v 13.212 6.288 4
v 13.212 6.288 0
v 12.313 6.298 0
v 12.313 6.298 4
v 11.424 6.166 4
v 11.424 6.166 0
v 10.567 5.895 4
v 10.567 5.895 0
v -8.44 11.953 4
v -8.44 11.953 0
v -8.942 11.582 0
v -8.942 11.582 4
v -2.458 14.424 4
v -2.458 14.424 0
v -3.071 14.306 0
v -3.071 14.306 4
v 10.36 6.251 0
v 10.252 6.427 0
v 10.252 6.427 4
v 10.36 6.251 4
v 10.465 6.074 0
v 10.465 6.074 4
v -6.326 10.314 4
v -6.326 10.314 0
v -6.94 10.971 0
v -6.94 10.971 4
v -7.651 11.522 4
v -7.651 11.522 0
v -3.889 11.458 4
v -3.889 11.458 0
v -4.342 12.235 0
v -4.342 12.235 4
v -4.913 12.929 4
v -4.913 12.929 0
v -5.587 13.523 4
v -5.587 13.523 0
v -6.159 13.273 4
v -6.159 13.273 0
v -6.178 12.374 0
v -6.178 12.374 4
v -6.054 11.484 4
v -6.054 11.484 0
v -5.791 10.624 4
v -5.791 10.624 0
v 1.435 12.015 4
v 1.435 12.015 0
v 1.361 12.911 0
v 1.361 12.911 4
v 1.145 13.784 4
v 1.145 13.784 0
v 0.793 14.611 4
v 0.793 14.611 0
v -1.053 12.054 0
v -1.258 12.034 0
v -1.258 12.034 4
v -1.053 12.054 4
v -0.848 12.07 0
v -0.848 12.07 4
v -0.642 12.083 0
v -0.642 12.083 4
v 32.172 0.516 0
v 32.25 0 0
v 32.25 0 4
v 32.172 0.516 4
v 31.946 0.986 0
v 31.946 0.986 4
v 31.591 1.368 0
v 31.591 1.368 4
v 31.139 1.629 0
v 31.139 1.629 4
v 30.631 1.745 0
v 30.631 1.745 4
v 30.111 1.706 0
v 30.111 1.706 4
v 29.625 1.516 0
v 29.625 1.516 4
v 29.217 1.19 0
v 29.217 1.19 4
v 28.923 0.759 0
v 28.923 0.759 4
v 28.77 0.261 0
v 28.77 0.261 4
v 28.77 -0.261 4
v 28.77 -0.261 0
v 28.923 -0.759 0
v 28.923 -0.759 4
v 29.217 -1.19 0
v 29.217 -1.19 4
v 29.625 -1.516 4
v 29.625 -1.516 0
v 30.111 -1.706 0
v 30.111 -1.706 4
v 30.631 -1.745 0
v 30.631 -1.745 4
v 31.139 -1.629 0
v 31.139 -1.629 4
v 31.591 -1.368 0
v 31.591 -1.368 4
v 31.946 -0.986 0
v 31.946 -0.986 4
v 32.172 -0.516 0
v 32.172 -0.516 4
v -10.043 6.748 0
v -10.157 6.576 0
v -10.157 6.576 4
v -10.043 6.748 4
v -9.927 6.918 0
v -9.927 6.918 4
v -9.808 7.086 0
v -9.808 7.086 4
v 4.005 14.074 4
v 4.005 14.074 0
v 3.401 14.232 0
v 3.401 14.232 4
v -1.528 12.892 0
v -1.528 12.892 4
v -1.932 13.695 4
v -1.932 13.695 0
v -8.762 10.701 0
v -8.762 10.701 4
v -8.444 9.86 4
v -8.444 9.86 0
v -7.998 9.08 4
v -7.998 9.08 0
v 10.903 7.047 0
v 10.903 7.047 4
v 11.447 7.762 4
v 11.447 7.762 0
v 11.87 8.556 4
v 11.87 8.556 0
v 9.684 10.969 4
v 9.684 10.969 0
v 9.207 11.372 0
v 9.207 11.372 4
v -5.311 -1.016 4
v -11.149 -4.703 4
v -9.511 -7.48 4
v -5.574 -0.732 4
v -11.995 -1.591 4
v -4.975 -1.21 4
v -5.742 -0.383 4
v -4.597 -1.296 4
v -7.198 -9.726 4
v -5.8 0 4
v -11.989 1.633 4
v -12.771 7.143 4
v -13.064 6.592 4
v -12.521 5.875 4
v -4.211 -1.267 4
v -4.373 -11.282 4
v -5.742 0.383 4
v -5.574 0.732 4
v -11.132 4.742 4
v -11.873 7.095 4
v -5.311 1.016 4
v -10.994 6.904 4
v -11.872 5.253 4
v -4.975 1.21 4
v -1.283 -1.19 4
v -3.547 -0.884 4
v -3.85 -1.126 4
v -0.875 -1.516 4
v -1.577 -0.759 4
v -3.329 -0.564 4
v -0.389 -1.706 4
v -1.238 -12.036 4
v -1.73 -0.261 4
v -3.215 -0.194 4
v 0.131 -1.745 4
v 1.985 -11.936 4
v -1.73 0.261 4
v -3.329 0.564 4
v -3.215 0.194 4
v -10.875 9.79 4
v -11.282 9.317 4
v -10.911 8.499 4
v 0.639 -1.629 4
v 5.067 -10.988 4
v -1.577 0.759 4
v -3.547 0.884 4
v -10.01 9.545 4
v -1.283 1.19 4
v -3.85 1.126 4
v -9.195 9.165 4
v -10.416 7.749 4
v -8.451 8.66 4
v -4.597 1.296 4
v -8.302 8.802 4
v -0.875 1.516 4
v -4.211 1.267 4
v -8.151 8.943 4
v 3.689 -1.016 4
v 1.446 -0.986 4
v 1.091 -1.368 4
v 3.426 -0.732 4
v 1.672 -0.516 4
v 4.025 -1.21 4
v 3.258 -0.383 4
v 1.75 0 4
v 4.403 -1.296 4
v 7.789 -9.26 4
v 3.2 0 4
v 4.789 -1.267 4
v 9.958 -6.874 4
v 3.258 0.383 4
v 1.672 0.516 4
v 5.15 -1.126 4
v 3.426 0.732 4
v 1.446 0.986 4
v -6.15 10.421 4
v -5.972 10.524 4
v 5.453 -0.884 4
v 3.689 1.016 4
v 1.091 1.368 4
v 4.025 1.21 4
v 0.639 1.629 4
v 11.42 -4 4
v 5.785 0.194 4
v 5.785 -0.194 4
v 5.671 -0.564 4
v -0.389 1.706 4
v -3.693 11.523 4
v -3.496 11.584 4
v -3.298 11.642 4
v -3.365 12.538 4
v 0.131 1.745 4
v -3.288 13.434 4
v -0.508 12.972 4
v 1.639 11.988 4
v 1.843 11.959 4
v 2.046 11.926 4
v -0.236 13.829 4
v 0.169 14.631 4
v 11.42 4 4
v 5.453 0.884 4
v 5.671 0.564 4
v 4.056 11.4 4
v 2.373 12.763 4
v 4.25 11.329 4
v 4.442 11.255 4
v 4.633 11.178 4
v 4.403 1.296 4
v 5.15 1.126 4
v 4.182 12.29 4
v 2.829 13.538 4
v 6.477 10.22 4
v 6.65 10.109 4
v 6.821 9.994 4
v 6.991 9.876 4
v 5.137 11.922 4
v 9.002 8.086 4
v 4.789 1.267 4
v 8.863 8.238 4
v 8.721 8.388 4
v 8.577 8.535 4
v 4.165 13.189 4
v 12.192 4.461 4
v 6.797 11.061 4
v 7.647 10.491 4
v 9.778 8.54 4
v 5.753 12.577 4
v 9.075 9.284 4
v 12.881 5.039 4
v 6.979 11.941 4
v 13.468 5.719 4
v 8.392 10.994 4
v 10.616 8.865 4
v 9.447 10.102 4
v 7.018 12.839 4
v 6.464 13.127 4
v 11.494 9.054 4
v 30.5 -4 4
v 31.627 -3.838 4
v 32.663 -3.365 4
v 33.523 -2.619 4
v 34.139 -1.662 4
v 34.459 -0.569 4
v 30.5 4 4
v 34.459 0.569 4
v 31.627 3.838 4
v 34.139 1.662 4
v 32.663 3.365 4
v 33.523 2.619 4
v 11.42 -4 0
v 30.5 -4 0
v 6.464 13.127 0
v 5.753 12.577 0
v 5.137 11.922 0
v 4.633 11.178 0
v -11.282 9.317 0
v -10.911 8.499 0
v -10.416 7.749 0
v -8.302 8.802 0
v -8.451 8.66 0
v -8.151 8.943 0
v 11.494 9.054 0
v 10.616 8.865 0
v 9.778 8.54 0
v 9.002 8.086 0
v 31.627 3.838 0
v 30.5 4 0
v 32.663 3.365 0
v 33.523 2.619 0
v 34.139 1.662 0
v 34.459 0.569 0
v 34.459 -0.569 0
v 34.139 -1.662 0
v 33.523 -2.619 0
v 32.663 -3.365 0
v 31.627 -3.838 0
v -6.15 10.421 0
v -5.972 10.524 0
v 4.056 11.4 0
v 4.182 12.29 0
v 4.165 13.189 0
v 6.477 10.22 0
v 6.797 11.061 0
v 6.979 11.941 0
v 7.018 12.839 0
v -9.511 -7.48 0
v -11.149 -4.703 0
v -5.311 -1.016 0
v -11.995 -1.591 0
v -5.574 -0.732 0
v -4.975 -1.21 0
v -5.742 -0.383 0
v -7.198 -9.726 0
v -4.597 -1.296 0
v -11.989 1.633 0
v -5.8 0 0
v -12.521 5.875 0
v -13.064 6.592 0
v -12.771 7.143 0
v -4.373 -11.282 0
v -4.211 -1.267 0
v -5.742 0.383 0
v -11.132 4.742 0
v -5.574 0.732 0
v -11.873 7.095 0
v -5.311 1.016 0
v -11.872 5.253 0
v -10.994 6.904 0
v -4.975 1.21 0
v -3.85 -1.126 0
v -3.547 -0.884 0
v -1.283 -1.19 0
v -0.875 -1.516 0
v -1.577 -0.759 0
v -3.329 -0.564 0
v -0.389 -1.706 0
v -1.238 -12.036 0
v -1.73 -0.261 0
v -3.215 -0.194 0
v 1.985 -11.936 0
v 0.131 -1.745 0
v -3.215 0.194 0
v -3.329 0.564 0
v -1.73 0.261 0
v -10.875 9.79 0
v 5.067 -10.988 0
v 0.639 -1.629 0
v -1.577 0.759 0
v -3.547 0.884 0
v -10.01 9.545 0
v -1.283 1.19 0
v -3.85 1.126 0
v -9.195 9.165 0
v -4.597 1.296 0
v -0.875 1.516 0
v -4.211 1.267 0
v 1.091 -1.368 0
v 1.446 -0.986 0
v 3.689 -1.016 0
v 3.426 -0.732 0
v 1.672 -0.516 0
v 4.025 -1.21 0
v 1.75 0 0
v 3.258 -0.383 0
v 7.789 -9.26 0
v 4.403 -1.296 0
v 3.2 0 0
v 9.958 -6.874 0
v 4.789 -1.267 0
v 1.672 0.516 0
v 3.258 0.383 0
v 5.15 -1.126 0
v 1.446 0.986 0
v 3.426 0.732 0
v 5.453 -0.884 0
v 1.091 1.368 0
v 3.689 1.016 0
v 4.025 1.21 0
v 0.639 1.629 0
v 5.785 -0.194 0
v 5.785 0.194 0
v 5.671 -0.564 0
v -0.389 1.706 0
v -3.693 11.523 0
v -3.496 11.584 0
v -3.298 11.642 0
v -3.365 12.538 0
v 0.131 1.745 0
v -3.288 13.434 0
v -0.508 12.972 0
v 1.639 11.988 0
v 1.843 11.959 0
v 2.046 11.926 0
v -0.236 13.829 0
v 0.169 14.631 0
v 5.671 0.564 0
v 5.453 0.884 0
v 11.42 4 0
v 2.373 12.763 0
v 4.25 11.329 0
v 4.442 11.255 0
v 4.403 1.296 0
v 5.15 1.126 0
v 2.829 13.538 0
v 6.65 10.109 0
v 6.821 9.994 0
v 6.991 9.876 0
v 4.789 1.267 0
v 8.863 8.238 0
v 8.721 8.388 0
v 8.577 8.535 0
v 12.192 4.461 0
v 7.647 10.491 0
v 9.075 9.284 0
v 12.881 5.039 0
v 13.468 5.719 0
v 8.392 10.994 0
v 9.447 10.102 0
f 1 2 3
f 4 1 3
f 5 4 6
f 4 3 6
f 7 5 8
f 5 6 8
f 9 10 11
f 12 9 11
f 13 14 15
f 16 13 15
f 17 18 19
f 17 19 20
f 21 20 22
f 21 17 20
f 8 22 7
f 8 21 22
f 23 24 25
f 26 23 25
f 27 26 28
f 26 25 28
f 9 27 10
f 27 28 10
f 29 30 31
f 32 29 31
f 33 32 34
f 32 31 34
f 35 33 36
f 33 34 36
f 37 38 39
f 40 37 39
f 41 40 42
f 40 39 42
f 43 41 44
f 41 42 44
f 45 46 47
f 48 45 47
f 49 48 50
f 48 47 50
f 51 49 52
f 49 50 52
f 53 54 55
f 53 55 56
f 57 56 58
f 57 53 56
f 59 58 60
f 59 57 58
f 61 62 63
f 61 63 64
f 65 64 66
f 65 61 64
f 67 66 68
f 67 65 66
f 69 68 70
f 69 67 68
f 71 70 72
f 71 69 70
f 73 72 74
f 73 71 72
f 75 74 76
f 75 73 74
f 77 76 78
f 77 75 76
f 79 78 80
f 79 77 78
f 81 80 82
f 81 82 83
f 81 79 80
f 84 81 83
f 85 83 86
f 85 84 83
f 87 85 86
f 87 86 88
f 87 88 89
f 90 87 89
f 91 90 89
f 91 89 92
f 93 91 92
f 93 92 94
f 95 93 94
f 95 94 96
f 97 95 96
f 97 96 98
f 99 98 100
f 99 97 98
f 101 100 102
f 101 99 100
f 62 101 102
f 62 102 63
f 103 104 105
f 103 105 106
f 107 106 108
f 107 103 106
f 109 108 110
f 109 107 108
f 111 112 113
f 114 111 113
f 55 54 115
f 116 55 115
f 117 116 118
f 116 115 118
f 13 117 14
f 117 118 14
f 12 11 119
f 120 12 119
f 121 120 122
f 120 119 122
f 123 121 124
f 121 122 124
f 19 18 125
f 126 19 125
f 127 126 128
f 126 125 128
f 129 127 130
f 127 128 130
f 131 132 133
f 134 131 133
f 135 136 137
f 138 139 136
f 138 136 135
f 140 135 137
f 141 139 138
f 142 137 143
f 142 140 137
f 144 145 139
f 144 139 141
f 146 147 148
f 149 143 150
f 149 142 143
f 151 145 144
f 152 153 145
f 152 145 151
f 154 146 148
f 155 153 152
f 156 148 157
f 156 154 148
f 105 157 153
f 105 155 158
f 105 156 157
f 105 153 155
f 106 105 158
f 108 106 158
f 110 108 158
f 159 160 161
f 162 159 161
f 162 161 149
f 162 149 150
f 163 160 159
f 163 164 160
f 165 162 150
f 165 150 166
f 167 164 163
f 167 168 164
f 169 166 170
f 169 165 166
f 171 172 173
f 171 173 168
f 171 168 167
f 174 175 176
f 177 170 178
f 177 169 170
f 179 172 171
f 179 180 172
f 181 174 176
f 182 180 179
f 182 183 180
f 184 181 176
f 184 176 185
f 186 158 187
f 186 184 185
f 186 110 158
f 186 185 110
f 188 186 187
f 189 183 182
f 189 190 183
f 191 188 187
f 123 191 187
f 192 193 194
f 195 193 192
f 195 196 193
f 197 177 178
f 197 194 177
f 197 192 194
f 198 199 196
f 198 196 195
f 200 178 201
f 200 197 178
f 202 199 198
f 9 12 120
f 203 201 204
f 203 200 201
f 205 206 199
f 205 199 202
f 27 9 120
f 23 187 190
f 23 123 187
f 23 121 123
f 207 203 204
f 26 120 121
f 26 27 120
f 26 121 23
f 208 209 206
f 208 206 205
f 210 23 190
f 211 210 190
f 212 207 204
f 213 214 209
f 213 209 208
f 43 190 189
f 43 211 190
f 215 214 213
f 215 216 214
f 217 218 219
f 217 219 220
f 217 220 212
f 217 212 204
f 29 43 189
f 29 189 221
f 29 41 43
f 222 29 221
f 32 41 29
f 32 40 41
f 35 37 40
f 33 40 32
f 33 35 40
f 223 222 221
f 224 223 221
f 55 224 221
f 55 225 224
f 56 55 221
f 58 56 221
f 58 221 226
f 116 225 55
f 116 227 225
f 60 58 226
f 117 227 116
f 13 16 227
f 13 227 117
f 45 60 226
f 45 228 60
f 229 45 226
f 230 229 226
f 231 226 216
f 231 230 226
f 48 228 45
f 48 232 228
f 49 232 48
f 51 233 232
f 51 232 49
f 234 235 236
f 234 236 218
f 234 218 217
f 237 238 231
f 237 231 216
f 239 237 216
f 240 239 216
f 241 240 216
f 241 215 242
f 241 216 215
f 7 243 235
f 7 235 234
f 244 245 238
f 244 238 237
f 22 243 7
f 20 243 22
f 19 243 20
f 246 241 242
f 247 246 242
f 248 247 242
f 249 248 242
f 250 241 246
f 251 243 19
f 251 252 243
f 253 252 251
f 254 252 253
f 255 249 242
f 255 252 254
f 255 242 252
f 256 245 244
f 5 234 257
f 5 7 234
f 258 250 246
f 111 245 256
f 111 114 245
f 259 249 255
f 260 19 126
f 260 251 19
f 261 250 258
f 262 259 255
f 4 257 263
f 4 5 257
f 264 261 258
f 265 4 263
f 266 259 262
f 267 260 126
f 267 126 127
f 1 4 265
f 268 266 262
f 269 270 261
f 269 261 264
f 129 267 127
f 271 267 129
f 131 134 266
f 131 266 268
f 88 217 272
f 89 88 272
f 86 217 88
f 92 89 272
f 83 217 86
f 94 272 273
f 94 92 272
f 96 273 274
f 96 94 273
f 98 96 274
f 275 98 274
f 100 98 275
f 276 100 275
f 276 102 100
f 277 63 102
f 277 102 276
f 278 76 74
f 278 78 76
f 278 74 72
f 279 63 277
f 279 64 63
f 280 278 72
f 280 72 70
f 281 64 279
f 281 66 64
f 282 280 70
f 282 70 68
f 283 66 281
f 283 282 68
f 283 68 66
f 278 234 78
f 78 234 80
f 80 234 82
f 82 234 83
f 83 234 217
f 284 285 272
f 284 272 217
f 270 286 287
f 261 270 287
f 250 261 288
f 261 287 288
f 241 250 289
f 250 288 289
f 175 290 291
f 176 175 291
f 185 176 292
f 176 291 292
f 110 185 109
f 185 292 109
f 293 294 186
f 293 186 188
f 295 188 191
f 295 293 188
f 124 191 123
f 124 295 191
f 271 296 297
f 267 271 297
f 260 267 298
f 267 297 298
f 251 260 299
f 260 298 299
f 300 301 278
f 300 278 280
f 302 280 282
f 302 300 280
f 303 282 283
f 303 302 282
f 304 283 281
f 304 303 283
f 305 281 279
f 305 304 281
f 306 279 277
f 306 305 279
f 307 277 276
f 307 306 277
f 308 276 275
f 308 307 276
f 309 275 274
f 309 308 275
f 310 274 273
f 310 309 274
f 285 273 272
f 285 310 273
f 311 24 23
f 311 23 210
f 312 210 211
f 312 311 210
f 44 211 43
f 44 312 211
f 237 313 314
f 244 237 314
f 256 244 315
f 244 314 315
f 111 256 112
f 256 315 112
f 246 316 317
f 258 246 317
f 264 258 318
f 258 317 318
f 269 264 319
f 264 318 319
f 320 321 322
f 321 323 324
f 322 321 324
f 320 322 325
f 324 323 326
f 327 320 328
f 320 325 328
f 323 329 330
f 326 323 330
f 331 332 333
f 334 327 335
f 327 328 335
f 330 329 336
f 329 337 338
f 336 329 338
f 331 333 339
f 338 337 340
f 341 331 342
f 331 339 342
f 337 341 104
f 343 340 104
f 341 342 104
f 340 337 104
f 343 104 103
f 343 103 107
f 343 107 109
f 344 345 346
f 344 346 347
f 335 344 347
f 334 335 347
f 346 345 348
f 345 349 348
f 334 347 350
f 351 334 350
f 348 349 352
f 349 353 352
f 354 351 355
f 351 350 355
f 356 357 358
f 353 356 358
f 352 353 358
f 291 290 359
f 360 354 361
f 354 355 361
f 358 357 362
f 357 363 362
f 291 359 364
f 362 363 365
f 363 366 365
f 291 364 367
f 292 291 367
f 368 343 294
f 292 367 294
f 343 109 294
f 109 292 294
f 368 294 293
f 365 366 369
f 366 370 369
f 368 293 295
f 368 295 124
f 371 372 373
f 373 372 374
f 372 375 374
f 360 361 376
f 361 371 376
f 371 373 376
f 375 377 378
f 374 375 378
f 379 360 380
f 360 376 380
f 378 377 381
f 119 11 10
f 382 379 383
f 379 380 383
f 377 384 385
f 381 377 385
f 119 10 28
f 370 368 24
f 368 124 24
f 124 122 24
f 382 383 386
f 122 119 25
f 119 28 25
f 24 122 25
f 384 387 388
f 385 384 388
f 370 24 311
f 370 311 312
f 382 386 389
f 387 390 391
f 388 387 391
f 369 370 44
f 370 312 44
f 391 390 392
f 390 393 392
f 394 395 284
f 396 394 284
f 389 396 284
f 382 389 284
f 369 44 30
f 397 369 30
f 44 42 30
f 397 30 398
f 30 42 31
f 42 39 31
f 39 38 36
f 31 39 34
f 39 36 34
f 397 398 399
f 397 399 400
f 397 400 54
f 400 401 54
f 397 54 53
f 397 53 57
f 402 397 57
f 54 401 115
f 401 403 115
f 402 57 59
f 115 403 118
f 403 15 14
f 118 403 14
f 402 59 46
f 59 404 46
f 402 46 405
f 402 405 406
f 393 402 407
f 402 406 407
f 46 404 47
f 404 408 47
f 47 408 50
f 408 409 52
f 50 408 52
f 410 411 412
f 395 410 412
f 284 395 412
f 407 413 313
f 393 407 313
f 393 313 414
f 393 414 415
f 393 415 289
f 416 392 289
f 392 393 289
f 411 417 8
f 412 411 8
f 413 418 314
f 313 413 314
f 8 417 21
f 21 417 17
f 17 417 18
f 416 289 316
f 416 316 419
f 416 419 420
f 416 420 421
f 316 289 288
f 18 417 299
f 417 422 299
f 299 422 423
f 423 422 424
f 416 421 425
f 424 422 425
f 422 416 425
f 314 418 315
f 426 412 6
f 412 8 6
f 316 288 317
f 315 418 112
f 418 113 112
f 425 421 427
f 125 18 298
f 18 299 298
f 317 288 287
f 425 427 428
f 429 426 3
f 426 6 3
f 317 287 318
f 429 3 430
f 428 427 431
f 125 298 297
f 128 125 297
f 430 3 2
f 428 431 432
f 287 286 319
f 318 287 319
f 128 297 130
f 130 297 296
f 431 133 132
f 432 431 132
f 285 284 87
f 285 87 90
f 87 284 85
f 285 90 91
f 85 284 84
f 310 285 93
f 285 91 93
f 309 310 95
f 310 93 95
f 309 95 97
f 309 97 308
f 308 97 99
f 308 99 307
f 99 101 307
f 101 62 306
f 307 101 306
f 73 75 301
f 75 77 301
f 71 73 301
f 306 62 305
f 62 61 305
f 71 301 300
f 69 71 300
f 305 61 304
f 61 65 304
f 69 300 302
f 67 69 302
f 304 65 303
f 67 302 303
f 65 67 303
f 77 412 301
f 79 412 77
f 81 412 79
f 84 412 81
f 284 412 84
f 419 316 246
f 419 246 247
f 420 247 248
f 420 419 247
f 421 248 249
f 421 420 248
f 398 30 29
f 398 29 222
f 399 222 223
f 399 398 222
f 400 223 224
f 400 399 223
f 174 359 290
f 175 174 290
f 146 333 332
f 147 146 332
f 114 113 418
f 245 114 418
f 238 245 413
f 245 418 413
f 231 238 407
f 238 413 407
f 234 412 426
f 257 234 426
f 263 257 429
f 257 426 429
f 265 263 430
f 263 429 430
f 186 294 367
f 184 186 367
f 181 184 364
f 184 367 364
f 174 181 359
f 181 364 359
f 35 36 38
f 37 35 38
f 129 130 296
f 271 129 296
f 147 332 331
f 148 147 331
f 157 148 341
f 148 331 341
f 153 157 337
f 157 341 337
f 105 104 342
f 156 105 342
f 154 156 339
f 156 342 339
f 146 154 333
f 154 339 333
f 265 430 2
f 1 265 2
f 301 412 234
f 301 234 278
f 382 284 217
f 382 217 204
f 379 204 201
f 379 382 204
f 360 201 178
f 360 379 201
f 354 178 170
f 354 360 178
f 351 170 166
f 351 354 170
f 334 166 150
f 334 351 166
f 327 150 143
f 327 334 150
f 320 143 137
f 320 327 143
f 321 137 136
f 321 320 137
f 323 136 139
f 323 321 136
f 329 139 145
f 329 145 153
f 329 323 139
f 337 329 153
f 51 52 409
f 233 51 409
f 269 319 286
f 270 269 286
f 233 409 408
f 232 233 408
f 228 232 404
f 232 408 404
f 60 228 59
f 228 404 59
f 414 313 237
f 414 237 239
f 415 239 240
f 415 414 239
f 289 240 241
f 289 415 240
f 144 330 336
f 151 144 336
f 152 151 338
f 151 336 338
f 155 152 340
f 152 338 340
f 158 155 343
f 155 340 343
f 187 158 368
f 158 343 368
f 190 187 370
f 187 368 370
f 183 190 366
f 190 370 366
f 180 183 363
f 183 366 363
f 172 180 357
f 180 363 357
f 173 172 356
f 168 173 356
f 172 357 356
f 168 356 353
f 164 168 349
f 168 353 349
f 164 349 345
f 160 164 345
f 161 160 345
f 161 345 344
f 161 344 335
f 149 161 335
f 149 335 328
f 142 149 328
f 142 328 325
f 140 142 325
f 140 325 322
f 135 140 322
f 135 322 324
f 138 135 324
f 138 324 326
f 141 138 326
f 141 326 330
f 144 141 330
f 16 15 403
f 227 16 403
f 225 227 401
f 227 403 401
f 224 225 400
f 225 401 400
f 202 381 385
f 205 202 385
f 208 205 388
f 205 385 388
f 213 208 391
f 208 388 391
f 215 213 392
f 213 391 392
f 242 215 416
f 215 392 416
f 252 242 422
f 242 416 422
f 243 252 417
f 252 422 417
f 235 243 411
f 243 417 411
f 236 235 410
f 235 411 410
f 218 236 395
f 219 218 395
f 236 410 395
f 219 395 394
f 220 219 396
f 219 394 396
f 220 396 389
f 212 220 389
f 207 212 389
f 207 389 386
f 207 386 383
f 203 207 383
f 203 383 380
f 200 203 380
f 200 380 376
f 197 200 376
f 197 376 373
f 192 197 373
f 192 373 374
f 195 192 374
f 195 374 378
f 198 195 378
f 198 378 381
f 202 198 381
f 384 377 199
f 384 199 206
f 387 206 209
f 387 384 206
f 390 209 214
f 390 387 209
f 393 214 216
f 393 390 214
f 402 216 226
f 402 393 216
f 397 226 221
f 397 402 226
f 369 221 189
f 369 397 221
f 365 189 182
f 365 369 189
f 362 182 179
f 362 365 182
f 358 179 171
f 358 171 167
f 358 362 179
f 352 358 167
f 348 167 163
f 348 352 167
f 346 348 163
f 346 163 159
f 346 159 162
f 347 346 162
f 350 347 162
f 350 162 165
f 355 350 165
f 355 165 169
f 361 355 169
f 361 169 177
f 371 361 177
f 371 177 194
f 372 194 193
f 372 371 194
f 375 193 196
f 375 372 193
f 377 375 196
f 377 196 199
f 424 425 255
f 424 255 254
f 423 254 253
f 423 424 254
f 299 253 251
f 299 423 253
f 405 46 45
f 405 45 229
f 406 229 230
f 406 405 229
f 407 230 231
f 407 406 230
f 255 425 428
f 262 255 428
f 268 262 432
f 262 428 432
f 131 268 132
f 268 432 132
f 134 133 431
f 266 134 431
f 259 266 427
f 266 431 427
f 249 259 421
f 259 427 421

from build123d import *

# Parameters (mm, degrees)
SKETCH1_R           = 1.75
BOSS_EXTRUDE2_DEPTH = 4
SKETCH2_R           = 1.3
CUT_EXTRUDE1_DEPTH  = 10


with BuildPart() as part:
    # Sketch1 → Boss-Extrude2 (new body)
    # profile 1 of 12: a face of its own
    with BuildSketch(Plane.XY):
        with BuildLine():
            Line((30.5, -4), (11.419719786, -4))
            ThreePointArc((11.419719786, -4), (-12.1, 0), (11.419719786, 4))
            Line((11.419719786, 4), (30.5, 4))
            ThreePointArc((30.5, 4), (34.5, 0), (30.5, -4))
        make_face()
        Circle(SKETCH1_R, mode=Mode.SUBTRACT)
        with Locations((30.5, 0)):
            Circle(SKETCH1_R, mode=Mode.SUBTRACT)
    # profile 2 of 12: a face of its own
    with BuildSketch(Plane.XY):
        with BuildLine():
            ThreePointArc((2.04630572, 11.925713098), (3.062574606, 11.706008576), (4.056229837, 11.399868399))
            ThreePointArc((4.056229837, 11.399868399), (4.191789848, 12.739862338), (4.004557713, 14.073618088))
            Line((4.004557713, 14.073618088), (3.400741544, 14.231598069))
            ThreePointArc((3.400741544, 14.231598069), (2.585583316, 13.159679272), (2.04630572, 11.925713098))
        make_face()
    # profile 3 of 12: a face of its own
    with BuildSketch(Plane.XY):
        with BuildLine():
            ThreePointArc((-0.641917286, 12.082960821), (0.397776079, 12.093459976), (1.434532317, 12.014662585))
            ThreePointArc((1.434532317, 12.014662585), (1.27037575, 13.351454601), (0.792800193, 14.610772615))
            Line((0.792800193, 14.610772615), (0.168997044, 14.631297504))
            ThreePointArc((0.168997044, 14.631297504), (-0.388904138, 13.405638858), (-0.641917286, 12.082960821))
        make_face()
    # profile 4 of 12: a face of its own
    with BuildSketch(Plane.XY):
        with BuildLine():
            ThreePointArc((-3.071117398, 14.306350498), (-3.344130279, 12.987655382), (-3.298347959, 11.641773952))
            ThreePointArc((-3.298347959, 11.641773952), (-2.286723162, 11.881956791), (-1.258213497, 12.034404796))
            ThreePointArc((-1.258213497, 12.034404796), (-1.713956435, 13.301787393), (-2.458222459, 14.424297241))
            Line((-2.458222459, 14.424297241), (-3.071117398, 14.306350498))
        make_face()
    # profile 5 of 12: a face of its own
    with BuildSketch(Plane.XY):
        with BuildLine():
            ThreePointArc((-6.159128153, 13.272850751), (-6.133731183, 11.926430371), (-5.791420864, 10.624003218))
            ThreePointArc((-5.791420864, 10.624003218), (-4.857967527, 11.08197417), (-3.888643585, 11.458117257))
            ThreePointArc((-3.888643585, 11.458117257), (-4.613401246, 12.593320589), (-5.587496363, 13.523427559))
            Line((-5.587496363, 13.523427559), (-6.159128153, 13.272850751))
        make_face()
    # profile 6 of 12: a face of its own
    with BuildSketch(Plane.XY):
        with BuildLine():
            ThreePointArc((-8.942094855, 11.581984556), (-8.619545875, 10.274523276), (-7.997661209, 9.080055902))
            ThreePointArc((-7.997661209, 9.080055902), (-7.188610613, 9.733132972), (-6.326480245, 10.314341845))
            ThreePointArc((-6.326480245, 10.314341845), (-7.28435745, 11.261142529), (-8.440037507, 11.952781076))
            Line((-8.440037507, 11.952781076), (-8.942094855, 11.581984556))
        make_face()
    # profile 7 of 12: a face of its own
    with BuildSketch(Plane.XY):
        with BuildLine():
            ThreePointArc((-11.2821851, 9.317495695), (-10.67845904, 8.113748343), (-9.807800202, 7.086399311))
            ThreePointArc((-9.807800202, 7.086399311), (-9.163222316, 7.902237454), (-8.450984381, 8.659726496))
            ThreePointArc((-8.450984381, 8.659726496), (-9.594540202, 9.371232193), (-10.874567661, 9.790147432))
            Line((-10.874567661, 9.790147432), (-11.2821851, 9.317495695))
        make_face()
    # profile 8 of 12: a face of its own
    with BuildSketch(Plane.XY):
        with BuildLine():
            ThreePointArc((-13.06350089, 6.591537844), (-12.208498581, 5.551122593), (-11.13218682, 4.741773571))
            ThreePointArc((-11.13218682, 4.741773571), (-10.684005749, 5.67996665), (-10.15693536, 6.576219589))
            ThreePointArc((-10.15693536, 6.576219589), (-11.42953274, 7.017191451), (-12.770511491, 7.142635705))
            Line((-12.770511491, 7.142635705), (-13.06350089, 6.591537844))
        make_face()
    # profile 9 of 12: a face of its own
    with BuildSketch(Plane.XY):
        with BuildLine():
            ThreePointArc((4.633181039, 11.177818815), (5.575692546, 10.738791954), (6.47703386, 10.22047124))
            ThreePointArc((6.47703386, 10.22047124), (6.905596548, 11.497301024), (7.017980909, 12.839437391))
            Line((7.017980909, 12.839437391), (6.464057014, 13.127048167))
            ThreePointArc((6.464057014, 13.127048167), (5.432014202, 12.2619583), (4.633181039, 11.177818815))
        make_face()
    # profile 10 of 12: a face of its own
    with BuildSketch(Plane.XY):
        with BuildLine():
            ThreePointArc((6.990588114, 9.876319042), (7.812662335, 9.239713591), (8.577048867, 8.534883288))
            ThreePointArc((8.577048867, 8.534883288), (9.277388744, 9.685311177), (9.683823524, 10.969355975))
            Line((9.683823524, 10.969355975), (9.207226173, 11.372353004))
            ThreePointArc((9.207226173, 11.372353004), (8.009412915, 10.7569375), (6.990588114, 9.876319042))
        make_face()
    # profile 11 of 12: a face of its own
    with BuildSketch(Plane.XY):
        with BuildLine():
            ThreePointArc((9.001771295, 8.085673352), (9.662693238, 7.283018563), (10.252267103, 6.426586905))
            ThreePointArc((10.252267103, 6.426586905), (11.189698333, 7.393635488), (11.870053976, 8.555993639))
            Line((11.870053976, 8.555993639), (11.494387677, 9.054417628))
            ThreePointArc((11.494387677, 9.054417628), (10.190128247, 8.719156263), (9.001771295, 8.085673352))
        make_face()
    # profile 12 of 12: a face of its own
    with BuildSketch(Plane.XY):
        with BuildLine():
            ThreePointArc((10.567122415, 5.894567319), (11.034158501, 4.965616394), (11.419719786, 4))
            ThreePointArc((11.419719786, 4), (12.547814073, 4.735774119), (13.468394505, 5.718877338))
            Line((13.468394505, 5.718877338), (13.212264939, 6.288042768))
            ThreePointArc((13.212264939, 6.288042768), (11.866155587, 6.249540081), (10.567122415, 5.894567319))
        make_face()
    extrude(amount=BOSS_EXTRUDE2_DEPTH)

    # Sketch2 → Cut-Extrude1 (cut)
    with BuildSketch(Plane(origin=(0, 0, 0), x_dir=(-1, 0, 0), z_dir=(0, 0, -1))):
        with Locations((4.5, 0)):
            Circle(SKETCH2_R)
        with Locations((-4.5, 0)):
            Circle(SKETCH2_R)
    extrude(amount=-CUT_EXTRUDE1_DEPTH, mode=Mode.SUBTRACT)


solid = part.part
